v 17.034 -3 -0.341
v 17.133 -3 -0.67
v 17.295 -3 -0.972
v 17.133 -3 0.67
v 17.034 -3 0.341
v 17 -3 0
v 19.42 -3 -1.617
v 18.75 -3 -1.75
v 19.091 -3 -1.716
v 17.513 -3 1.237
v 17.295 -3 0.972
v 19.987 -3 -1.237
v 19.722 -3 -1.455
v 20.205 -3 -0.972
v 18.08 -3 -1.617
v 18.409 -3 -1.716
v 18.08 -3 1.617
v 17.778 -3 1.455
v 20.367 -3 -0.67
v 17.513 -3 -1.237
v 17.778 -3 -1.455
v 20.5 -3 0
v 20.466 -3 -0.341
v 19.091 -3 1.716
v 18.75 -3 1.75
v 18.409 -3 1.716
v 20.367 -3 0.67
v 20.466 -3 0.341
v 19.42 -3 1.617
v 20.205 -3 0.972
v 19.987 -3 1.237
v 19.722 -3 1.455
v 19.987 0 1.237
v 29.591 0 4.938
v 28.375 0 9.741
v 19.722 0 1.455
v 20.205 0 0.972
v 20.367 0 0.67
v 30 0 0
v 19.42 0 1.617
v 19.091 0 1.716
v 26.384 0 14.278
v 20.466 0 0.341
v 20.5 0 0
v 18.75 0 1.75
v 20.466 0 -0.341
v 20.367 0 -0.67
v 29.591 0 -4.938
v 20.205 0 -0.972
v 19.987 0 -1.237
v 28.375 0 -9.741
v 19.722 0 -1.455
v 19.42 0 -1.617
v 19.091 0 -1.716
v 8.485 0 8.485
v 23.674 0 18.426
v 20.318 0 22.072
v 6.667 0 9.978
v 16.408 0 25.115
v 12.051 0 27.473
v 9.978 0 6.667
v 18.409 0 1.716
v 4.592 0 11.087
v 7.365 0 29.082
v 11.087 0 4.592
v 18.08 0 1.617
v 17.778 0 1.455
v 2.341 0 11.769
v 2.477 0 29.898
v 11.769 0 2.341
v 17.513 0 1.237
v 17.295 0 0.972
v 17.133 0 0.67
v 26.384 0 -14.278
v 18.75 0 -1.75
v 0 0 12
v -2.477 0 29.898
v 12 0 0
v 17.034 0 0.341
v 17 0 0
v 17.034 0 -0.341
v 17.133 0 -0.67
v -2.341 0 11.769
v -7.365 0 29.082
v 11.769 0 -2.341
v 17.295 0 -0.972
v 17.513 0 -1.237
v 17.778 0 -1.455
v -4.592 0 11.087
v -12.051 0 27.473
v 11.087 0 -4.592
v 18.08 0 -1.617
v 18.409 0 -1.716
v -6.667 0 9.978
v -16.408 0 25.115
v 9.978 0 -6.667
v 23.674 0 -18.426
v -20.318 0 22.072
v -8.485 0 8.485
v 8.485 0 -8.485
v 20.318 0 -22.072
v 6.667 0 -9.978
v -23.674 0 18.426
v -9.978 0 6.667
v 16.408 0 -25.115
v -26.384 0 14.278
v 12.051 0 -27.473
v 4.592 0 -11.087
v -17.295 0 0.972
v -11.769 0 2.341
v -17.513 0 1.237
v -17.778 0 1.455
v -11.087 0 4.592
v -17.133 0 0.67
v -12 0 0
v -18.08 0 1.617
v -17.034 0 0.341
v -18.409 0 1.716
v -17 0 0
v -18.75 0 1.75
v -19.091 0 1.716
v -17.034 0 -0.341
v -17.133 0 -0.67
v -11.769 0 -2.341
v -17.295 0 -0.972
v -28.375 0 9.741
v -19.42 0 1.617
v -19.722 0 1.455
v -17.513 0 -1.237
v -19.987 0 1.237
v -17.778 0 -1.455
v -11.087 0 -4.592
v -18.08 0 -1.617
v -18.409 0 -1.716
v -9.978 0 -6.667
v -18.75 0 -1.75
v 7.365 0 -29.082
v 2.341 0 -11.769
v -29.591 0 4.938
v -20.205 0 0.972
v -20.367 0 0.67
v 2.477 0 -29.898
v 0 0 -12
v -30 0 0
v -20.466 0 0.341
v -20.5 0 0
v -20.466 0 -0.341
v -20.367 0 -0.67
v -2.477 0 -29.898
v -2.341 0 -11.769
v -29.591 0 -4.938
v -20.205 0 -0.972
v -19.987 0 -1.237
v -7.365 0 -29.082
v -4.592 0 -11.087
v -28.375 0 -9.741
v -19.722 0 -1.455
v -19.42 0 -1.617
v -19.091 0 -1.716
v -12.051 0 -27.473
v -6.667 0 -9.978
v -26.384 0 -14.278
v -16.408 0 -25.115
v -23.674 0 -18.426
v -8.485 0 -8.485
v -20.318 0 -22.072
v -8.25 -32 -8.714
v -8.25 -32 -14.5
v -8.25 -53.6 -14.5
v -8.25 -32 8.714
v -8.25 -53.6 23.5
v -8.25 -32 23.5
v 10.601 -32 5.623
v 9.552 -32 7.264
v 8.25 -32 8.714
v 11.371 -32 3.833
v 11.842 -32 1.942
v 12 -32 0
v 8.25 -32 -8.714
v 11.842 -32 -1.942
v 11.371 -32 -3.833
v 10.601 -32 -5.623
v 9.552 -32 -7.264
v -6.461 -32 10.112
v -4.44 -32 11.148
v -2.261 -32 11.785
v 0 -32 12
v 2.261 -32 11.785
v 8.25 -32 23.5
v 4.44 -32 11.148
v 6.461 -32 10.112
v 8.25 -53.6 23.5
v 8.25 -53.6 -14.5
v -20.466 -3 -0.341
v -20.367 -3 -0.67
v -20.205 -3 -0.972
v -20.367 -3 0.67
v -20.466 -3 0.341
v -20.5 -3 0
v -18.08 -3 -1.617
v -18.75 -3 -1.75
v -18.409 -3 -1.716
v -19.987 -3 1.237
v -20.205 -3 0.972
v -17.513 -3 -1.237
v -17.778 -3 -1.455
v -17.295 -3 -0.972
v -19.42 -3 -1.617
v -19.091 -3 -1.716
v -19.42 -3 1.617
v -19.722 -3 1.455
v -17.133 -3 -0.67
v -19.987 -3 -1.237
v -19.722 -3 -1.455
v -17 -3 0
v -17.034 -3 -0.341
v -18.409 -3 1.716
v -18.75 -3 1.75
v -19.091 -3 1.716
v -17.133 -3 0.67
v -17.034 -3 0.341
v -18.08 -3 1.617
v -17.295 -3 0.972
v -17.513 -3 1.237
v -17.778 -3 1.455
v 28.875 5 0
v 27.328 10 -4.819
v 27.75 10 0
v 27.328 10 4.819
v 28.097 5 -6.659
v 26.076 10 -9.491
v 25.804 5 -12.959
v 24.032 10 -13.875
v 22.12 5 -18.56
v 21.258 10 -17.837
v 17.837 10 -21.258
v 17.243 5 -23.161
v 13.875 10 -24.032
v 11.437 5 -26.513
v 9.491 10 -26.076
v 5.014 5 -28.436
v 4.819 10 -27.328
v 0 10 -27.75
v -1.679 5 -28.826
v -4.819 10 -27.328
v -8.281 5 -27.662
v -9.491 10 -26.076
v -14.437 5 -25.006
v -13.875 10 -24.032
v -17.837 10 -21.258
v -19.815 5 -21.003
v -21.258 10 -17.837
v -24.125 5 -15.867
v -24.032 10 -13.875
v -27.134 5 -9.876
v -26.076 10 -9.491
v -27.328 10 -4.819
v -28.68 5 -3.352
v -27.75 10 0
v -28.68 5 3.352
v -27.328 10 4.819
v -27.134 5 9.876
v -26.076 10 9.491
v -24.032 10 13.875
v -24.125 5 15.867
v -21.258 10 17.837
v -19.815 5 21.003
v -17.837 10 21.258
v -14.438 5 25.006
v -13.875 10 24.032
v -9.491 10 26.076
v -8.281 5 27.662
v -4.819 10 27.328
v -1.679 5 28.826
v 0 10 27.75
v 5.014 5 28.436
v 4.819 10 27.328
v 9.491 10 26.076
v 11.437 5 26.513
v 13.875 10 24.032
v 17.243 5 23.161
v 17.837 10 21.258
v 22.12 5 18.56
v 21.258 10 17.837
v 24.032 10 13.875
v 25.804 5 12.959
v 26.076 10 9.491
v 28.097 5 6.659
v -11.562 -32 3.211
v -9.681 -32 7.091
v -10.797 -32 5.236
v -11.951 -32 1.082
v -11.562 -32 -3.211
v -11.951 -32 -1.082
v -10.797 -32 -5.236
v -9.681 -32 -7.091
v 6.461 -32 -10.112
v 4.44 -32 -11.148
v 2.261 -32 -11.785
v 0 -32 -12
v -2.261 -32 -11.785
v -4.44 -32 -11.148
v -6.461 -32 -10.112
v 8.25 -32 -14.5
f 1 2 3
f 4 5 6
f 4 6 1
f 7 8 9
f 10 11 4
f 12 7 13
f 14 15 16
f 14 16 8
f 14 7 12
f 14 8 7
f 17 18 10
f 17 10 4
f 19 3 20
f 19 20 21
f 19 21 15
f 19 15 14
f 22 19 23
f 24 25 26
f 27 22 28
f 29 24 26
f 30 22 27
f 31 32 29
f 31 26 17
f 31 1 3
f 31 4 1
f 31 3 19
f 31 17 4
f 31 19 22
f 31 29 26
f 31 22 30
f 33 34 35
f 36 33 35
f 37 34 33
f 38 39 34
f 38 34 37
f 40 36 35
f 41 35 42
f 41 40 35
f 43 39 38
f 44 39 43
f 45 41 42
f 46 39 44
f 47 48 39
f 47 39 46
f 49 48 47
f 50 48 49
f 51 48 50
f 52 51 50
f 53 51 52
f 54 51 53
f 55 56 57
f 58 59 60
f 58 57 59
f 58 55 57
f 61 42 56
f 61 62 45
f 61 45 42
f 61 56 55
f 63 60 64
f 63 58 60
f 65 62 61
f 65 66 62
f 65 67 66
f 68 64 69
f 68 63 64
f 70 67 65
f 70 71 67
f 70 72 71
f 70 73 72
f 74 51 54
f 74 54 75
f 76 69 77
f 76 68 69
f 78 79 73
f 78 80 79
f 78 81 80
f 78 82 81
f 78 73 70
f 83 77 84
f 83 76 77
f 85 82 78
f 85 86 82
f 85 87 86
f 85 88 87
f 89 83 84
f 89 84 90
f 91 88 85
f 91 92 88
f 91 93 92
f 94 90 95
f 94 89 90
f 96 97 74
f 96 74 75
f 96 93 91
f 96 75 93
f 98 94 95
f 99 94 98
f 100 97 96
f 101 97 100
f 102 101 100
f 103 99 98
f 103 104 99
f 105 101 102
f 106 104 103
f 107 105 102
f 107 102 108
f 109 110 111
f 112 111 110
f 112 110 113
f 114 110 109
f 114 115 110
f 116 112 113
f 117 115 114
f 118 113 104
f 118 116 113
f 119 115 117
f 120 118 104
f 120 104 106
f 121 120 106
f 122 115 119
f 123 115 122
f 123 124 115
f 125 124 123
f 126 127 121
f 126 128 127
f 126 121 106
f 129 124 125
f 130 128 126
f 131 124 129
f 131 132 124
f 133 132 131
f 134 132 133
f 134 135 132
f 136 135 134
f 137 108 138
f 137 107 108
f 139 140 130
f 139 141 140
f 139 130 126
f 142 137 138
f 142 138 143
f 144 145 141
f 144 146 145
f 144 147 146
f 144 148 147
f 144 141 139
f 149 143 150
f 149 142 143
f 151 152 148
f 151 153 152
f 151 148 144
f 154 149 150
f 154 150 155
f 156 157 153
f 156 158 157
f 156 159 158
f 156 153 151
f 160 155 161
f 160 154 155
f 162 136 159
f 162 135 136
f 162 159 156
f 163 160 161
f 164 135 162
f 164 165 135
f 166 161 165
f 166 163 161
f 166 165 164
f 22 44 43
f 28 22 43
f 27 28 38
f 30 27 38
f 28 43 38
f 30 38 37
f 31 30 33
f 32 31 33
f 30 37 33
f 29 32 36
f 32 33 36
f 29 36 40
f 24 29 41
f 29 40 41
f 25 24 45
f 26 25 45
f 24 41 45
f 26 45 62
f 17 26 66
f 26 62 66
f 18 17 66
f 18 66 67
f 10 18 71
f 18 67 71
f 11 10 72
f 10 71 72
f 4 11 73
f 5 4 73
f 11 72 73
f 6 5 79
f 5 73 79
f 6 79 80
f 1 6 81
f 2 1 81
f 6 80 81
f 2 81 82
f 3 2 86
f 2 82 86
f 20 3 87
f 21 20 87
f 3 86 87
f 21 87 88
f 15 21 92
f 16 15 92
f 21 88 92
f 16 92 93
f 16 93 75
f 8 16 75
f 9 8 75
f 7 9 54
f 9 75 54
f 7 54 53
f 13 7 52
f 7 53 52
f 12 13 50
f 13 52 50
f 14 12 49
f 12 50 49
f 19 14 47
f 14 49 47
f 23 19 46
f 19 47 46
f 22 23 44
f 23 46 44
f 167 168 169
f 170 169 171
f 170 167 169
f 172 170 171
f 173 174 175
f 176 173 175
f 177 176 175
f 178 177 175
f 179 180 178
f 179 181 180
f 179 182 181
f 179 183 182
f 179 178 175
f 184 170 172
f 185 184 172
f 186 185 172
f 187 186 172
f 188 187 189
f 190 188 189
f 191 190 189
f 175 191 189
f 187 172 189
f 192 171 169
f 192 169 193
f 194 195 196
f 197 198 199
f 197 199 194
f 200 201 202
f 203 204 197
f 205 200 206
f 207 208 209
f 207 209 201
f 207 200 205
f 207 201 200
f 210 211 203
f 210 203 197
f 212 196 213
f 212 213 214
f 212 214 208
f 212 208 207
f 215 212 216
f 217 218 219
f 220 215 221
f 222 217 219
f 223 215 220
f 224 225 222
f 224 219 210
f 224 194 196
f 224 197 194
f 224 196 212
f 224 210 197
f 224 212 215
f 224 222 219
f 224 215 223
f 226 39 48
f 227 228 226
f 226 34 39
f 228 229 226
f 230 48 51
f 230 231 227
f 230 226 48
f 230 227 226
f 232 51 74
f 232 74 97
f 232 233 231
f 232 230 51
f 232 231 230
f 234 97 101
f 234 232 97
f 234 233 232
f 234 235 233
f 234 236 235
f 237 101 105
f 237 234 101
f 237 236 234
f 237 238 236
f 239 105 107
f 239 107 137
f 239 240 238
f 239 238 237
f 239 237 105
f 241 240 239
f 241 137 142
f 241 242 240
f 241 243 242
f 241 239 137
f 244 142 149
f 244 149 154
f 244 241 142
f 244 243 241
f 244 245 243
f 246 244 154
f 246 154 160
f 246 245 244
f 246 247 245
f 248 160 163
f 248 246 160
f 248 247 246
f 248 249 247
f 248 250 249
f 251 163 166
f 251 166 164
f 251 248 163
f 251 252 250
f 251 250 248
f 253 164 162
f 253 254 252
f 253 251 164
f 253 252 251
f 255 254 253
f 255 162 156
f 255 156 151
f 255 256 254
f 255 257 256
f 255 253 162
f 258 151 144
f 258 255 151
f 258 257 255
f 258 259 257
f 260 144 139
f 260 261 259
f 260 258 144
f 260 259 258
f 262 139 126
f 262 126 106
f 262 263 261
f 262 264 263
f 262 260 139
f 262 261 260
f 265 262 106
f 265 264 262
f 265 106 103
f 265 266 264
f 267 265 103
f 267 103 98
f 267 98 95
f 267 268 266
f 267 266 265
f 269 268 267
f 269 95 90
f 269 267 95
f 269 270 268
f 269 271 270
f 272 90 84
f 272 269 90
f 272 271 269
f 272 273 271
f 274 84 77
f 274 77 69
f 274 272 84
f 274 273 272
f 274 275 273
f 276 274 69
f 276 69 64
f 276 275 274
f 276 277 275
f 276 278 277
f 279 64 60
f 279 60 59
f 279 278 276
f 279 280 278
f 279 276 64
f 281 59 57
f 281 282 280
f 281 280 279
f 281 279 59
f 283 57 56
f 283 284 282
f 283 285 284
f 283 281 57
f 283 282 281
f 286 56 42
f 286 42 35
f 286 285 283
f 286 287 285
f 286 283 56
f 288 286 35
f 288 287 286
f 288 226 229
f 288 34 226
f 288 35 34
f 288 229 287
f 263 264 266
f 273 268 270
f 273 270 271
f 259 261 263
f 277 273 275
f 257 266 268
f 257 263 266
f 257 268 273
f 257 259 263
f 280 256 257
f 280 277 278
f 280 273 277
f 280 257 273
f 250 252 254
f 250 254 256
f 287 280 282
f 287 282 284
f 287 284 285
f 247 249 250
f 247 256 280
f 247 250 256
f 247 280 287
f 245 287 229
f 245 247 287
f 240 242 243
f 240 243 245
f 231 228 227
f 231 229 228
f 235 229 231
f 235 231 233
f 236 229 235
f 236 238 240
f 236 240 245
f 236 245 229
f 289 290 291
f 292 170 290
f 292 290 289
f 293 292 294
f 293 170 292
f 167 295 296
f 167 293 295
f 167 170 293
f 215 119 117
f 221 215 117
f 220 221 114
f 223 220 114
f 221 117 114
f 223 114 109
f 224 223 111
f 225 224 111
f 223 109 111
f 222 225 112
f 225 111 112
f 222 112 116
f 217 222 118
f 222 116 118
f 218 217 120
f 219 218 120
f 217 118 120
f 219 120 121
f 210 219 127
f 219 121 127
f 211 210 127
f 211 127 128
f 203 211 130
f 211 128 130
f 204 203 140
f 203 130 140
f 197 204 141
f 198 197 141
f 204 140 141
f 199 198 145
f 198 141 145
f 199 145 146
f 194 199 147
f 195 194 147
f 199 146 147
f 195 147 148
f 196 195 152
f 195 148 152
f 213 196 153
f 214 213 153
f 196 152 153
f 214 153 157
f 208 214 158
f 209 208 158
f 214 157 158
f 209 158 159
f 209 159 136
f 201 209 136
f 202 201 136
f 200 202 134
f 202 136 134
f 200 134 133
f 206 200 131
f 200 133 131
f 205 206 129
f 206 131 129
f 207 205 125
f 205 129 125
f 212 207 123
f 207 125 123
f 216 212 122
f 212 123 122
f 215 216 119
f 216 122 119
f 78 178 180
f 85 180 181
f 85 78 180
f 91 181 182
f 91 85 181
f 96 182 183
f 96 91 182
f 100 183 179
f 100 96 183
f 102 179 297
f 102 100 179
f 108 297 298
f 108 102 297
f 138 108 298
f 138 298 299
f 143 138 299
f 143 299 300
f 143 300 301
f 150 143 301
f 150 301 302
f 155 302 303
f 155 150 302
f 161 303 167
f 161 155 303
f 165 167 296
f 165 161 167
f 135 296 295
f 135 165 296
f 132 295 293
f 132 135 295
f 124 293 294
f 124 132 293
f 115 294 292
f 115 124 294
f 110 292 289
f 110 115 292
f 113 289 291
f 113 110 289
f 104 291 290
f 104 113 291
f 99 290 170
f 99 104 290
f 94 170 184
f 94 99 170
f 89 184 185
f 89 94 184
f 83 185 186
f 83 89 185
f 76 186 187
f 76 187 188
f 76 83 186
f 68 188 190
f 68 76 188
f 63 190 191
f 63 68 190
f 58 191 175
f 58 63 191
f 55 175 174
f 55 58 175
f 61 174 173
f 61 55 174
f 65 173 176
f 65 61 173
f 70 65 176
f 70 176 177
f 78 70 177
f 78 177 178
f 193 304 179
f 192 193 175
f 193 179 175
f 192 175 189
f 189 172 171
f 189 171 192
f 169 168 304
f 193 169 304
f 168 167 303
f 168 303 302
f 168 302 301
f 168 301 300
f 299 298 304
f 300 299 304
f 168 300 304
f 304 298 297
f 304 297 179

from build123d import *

# Parameters (mm, degrees)
SKETCH023_R  = 1.75
PAD012_DEPTH = 3
SKETCH024_W  = 16.5
SKETCH024_H  = 38
PAD013_DEPTH = 21.6


with BuildPart() as part:
    # Sketch021 → Revolution005 (revolve)
    with BuildSketch(Plane.XY):
        Polygon((0, 0), (0, -32), (12, -32), (12, 0), (30, 0), (27.75, 10), (0, 10), align=None)
    revolve(axis=Axis((0, 0, 0), (0, 1, 0)))

    # Sketch023 → Pad012 (new body)
    with BuildSketch(Plane.XZ):
        with Locations((18.75, 0)):
            Circle(SKETCH023_R)
        with Locations((-18.75, 0)):
            Circle(SKETCH023_R)
    extrude(amount=PAD012_DEPTH)

    # Sketch024 (on Face1 of Pad012) → Pad013 (join)
    with BuildSketch(Plane.XZ.offset(32)):
        with Locations((0, 4.5)):
            Rectangle(SKETCH024_W, SKETCH024_H)
    extrude(amount=PAD013_DEPTH)


solid = part.part
